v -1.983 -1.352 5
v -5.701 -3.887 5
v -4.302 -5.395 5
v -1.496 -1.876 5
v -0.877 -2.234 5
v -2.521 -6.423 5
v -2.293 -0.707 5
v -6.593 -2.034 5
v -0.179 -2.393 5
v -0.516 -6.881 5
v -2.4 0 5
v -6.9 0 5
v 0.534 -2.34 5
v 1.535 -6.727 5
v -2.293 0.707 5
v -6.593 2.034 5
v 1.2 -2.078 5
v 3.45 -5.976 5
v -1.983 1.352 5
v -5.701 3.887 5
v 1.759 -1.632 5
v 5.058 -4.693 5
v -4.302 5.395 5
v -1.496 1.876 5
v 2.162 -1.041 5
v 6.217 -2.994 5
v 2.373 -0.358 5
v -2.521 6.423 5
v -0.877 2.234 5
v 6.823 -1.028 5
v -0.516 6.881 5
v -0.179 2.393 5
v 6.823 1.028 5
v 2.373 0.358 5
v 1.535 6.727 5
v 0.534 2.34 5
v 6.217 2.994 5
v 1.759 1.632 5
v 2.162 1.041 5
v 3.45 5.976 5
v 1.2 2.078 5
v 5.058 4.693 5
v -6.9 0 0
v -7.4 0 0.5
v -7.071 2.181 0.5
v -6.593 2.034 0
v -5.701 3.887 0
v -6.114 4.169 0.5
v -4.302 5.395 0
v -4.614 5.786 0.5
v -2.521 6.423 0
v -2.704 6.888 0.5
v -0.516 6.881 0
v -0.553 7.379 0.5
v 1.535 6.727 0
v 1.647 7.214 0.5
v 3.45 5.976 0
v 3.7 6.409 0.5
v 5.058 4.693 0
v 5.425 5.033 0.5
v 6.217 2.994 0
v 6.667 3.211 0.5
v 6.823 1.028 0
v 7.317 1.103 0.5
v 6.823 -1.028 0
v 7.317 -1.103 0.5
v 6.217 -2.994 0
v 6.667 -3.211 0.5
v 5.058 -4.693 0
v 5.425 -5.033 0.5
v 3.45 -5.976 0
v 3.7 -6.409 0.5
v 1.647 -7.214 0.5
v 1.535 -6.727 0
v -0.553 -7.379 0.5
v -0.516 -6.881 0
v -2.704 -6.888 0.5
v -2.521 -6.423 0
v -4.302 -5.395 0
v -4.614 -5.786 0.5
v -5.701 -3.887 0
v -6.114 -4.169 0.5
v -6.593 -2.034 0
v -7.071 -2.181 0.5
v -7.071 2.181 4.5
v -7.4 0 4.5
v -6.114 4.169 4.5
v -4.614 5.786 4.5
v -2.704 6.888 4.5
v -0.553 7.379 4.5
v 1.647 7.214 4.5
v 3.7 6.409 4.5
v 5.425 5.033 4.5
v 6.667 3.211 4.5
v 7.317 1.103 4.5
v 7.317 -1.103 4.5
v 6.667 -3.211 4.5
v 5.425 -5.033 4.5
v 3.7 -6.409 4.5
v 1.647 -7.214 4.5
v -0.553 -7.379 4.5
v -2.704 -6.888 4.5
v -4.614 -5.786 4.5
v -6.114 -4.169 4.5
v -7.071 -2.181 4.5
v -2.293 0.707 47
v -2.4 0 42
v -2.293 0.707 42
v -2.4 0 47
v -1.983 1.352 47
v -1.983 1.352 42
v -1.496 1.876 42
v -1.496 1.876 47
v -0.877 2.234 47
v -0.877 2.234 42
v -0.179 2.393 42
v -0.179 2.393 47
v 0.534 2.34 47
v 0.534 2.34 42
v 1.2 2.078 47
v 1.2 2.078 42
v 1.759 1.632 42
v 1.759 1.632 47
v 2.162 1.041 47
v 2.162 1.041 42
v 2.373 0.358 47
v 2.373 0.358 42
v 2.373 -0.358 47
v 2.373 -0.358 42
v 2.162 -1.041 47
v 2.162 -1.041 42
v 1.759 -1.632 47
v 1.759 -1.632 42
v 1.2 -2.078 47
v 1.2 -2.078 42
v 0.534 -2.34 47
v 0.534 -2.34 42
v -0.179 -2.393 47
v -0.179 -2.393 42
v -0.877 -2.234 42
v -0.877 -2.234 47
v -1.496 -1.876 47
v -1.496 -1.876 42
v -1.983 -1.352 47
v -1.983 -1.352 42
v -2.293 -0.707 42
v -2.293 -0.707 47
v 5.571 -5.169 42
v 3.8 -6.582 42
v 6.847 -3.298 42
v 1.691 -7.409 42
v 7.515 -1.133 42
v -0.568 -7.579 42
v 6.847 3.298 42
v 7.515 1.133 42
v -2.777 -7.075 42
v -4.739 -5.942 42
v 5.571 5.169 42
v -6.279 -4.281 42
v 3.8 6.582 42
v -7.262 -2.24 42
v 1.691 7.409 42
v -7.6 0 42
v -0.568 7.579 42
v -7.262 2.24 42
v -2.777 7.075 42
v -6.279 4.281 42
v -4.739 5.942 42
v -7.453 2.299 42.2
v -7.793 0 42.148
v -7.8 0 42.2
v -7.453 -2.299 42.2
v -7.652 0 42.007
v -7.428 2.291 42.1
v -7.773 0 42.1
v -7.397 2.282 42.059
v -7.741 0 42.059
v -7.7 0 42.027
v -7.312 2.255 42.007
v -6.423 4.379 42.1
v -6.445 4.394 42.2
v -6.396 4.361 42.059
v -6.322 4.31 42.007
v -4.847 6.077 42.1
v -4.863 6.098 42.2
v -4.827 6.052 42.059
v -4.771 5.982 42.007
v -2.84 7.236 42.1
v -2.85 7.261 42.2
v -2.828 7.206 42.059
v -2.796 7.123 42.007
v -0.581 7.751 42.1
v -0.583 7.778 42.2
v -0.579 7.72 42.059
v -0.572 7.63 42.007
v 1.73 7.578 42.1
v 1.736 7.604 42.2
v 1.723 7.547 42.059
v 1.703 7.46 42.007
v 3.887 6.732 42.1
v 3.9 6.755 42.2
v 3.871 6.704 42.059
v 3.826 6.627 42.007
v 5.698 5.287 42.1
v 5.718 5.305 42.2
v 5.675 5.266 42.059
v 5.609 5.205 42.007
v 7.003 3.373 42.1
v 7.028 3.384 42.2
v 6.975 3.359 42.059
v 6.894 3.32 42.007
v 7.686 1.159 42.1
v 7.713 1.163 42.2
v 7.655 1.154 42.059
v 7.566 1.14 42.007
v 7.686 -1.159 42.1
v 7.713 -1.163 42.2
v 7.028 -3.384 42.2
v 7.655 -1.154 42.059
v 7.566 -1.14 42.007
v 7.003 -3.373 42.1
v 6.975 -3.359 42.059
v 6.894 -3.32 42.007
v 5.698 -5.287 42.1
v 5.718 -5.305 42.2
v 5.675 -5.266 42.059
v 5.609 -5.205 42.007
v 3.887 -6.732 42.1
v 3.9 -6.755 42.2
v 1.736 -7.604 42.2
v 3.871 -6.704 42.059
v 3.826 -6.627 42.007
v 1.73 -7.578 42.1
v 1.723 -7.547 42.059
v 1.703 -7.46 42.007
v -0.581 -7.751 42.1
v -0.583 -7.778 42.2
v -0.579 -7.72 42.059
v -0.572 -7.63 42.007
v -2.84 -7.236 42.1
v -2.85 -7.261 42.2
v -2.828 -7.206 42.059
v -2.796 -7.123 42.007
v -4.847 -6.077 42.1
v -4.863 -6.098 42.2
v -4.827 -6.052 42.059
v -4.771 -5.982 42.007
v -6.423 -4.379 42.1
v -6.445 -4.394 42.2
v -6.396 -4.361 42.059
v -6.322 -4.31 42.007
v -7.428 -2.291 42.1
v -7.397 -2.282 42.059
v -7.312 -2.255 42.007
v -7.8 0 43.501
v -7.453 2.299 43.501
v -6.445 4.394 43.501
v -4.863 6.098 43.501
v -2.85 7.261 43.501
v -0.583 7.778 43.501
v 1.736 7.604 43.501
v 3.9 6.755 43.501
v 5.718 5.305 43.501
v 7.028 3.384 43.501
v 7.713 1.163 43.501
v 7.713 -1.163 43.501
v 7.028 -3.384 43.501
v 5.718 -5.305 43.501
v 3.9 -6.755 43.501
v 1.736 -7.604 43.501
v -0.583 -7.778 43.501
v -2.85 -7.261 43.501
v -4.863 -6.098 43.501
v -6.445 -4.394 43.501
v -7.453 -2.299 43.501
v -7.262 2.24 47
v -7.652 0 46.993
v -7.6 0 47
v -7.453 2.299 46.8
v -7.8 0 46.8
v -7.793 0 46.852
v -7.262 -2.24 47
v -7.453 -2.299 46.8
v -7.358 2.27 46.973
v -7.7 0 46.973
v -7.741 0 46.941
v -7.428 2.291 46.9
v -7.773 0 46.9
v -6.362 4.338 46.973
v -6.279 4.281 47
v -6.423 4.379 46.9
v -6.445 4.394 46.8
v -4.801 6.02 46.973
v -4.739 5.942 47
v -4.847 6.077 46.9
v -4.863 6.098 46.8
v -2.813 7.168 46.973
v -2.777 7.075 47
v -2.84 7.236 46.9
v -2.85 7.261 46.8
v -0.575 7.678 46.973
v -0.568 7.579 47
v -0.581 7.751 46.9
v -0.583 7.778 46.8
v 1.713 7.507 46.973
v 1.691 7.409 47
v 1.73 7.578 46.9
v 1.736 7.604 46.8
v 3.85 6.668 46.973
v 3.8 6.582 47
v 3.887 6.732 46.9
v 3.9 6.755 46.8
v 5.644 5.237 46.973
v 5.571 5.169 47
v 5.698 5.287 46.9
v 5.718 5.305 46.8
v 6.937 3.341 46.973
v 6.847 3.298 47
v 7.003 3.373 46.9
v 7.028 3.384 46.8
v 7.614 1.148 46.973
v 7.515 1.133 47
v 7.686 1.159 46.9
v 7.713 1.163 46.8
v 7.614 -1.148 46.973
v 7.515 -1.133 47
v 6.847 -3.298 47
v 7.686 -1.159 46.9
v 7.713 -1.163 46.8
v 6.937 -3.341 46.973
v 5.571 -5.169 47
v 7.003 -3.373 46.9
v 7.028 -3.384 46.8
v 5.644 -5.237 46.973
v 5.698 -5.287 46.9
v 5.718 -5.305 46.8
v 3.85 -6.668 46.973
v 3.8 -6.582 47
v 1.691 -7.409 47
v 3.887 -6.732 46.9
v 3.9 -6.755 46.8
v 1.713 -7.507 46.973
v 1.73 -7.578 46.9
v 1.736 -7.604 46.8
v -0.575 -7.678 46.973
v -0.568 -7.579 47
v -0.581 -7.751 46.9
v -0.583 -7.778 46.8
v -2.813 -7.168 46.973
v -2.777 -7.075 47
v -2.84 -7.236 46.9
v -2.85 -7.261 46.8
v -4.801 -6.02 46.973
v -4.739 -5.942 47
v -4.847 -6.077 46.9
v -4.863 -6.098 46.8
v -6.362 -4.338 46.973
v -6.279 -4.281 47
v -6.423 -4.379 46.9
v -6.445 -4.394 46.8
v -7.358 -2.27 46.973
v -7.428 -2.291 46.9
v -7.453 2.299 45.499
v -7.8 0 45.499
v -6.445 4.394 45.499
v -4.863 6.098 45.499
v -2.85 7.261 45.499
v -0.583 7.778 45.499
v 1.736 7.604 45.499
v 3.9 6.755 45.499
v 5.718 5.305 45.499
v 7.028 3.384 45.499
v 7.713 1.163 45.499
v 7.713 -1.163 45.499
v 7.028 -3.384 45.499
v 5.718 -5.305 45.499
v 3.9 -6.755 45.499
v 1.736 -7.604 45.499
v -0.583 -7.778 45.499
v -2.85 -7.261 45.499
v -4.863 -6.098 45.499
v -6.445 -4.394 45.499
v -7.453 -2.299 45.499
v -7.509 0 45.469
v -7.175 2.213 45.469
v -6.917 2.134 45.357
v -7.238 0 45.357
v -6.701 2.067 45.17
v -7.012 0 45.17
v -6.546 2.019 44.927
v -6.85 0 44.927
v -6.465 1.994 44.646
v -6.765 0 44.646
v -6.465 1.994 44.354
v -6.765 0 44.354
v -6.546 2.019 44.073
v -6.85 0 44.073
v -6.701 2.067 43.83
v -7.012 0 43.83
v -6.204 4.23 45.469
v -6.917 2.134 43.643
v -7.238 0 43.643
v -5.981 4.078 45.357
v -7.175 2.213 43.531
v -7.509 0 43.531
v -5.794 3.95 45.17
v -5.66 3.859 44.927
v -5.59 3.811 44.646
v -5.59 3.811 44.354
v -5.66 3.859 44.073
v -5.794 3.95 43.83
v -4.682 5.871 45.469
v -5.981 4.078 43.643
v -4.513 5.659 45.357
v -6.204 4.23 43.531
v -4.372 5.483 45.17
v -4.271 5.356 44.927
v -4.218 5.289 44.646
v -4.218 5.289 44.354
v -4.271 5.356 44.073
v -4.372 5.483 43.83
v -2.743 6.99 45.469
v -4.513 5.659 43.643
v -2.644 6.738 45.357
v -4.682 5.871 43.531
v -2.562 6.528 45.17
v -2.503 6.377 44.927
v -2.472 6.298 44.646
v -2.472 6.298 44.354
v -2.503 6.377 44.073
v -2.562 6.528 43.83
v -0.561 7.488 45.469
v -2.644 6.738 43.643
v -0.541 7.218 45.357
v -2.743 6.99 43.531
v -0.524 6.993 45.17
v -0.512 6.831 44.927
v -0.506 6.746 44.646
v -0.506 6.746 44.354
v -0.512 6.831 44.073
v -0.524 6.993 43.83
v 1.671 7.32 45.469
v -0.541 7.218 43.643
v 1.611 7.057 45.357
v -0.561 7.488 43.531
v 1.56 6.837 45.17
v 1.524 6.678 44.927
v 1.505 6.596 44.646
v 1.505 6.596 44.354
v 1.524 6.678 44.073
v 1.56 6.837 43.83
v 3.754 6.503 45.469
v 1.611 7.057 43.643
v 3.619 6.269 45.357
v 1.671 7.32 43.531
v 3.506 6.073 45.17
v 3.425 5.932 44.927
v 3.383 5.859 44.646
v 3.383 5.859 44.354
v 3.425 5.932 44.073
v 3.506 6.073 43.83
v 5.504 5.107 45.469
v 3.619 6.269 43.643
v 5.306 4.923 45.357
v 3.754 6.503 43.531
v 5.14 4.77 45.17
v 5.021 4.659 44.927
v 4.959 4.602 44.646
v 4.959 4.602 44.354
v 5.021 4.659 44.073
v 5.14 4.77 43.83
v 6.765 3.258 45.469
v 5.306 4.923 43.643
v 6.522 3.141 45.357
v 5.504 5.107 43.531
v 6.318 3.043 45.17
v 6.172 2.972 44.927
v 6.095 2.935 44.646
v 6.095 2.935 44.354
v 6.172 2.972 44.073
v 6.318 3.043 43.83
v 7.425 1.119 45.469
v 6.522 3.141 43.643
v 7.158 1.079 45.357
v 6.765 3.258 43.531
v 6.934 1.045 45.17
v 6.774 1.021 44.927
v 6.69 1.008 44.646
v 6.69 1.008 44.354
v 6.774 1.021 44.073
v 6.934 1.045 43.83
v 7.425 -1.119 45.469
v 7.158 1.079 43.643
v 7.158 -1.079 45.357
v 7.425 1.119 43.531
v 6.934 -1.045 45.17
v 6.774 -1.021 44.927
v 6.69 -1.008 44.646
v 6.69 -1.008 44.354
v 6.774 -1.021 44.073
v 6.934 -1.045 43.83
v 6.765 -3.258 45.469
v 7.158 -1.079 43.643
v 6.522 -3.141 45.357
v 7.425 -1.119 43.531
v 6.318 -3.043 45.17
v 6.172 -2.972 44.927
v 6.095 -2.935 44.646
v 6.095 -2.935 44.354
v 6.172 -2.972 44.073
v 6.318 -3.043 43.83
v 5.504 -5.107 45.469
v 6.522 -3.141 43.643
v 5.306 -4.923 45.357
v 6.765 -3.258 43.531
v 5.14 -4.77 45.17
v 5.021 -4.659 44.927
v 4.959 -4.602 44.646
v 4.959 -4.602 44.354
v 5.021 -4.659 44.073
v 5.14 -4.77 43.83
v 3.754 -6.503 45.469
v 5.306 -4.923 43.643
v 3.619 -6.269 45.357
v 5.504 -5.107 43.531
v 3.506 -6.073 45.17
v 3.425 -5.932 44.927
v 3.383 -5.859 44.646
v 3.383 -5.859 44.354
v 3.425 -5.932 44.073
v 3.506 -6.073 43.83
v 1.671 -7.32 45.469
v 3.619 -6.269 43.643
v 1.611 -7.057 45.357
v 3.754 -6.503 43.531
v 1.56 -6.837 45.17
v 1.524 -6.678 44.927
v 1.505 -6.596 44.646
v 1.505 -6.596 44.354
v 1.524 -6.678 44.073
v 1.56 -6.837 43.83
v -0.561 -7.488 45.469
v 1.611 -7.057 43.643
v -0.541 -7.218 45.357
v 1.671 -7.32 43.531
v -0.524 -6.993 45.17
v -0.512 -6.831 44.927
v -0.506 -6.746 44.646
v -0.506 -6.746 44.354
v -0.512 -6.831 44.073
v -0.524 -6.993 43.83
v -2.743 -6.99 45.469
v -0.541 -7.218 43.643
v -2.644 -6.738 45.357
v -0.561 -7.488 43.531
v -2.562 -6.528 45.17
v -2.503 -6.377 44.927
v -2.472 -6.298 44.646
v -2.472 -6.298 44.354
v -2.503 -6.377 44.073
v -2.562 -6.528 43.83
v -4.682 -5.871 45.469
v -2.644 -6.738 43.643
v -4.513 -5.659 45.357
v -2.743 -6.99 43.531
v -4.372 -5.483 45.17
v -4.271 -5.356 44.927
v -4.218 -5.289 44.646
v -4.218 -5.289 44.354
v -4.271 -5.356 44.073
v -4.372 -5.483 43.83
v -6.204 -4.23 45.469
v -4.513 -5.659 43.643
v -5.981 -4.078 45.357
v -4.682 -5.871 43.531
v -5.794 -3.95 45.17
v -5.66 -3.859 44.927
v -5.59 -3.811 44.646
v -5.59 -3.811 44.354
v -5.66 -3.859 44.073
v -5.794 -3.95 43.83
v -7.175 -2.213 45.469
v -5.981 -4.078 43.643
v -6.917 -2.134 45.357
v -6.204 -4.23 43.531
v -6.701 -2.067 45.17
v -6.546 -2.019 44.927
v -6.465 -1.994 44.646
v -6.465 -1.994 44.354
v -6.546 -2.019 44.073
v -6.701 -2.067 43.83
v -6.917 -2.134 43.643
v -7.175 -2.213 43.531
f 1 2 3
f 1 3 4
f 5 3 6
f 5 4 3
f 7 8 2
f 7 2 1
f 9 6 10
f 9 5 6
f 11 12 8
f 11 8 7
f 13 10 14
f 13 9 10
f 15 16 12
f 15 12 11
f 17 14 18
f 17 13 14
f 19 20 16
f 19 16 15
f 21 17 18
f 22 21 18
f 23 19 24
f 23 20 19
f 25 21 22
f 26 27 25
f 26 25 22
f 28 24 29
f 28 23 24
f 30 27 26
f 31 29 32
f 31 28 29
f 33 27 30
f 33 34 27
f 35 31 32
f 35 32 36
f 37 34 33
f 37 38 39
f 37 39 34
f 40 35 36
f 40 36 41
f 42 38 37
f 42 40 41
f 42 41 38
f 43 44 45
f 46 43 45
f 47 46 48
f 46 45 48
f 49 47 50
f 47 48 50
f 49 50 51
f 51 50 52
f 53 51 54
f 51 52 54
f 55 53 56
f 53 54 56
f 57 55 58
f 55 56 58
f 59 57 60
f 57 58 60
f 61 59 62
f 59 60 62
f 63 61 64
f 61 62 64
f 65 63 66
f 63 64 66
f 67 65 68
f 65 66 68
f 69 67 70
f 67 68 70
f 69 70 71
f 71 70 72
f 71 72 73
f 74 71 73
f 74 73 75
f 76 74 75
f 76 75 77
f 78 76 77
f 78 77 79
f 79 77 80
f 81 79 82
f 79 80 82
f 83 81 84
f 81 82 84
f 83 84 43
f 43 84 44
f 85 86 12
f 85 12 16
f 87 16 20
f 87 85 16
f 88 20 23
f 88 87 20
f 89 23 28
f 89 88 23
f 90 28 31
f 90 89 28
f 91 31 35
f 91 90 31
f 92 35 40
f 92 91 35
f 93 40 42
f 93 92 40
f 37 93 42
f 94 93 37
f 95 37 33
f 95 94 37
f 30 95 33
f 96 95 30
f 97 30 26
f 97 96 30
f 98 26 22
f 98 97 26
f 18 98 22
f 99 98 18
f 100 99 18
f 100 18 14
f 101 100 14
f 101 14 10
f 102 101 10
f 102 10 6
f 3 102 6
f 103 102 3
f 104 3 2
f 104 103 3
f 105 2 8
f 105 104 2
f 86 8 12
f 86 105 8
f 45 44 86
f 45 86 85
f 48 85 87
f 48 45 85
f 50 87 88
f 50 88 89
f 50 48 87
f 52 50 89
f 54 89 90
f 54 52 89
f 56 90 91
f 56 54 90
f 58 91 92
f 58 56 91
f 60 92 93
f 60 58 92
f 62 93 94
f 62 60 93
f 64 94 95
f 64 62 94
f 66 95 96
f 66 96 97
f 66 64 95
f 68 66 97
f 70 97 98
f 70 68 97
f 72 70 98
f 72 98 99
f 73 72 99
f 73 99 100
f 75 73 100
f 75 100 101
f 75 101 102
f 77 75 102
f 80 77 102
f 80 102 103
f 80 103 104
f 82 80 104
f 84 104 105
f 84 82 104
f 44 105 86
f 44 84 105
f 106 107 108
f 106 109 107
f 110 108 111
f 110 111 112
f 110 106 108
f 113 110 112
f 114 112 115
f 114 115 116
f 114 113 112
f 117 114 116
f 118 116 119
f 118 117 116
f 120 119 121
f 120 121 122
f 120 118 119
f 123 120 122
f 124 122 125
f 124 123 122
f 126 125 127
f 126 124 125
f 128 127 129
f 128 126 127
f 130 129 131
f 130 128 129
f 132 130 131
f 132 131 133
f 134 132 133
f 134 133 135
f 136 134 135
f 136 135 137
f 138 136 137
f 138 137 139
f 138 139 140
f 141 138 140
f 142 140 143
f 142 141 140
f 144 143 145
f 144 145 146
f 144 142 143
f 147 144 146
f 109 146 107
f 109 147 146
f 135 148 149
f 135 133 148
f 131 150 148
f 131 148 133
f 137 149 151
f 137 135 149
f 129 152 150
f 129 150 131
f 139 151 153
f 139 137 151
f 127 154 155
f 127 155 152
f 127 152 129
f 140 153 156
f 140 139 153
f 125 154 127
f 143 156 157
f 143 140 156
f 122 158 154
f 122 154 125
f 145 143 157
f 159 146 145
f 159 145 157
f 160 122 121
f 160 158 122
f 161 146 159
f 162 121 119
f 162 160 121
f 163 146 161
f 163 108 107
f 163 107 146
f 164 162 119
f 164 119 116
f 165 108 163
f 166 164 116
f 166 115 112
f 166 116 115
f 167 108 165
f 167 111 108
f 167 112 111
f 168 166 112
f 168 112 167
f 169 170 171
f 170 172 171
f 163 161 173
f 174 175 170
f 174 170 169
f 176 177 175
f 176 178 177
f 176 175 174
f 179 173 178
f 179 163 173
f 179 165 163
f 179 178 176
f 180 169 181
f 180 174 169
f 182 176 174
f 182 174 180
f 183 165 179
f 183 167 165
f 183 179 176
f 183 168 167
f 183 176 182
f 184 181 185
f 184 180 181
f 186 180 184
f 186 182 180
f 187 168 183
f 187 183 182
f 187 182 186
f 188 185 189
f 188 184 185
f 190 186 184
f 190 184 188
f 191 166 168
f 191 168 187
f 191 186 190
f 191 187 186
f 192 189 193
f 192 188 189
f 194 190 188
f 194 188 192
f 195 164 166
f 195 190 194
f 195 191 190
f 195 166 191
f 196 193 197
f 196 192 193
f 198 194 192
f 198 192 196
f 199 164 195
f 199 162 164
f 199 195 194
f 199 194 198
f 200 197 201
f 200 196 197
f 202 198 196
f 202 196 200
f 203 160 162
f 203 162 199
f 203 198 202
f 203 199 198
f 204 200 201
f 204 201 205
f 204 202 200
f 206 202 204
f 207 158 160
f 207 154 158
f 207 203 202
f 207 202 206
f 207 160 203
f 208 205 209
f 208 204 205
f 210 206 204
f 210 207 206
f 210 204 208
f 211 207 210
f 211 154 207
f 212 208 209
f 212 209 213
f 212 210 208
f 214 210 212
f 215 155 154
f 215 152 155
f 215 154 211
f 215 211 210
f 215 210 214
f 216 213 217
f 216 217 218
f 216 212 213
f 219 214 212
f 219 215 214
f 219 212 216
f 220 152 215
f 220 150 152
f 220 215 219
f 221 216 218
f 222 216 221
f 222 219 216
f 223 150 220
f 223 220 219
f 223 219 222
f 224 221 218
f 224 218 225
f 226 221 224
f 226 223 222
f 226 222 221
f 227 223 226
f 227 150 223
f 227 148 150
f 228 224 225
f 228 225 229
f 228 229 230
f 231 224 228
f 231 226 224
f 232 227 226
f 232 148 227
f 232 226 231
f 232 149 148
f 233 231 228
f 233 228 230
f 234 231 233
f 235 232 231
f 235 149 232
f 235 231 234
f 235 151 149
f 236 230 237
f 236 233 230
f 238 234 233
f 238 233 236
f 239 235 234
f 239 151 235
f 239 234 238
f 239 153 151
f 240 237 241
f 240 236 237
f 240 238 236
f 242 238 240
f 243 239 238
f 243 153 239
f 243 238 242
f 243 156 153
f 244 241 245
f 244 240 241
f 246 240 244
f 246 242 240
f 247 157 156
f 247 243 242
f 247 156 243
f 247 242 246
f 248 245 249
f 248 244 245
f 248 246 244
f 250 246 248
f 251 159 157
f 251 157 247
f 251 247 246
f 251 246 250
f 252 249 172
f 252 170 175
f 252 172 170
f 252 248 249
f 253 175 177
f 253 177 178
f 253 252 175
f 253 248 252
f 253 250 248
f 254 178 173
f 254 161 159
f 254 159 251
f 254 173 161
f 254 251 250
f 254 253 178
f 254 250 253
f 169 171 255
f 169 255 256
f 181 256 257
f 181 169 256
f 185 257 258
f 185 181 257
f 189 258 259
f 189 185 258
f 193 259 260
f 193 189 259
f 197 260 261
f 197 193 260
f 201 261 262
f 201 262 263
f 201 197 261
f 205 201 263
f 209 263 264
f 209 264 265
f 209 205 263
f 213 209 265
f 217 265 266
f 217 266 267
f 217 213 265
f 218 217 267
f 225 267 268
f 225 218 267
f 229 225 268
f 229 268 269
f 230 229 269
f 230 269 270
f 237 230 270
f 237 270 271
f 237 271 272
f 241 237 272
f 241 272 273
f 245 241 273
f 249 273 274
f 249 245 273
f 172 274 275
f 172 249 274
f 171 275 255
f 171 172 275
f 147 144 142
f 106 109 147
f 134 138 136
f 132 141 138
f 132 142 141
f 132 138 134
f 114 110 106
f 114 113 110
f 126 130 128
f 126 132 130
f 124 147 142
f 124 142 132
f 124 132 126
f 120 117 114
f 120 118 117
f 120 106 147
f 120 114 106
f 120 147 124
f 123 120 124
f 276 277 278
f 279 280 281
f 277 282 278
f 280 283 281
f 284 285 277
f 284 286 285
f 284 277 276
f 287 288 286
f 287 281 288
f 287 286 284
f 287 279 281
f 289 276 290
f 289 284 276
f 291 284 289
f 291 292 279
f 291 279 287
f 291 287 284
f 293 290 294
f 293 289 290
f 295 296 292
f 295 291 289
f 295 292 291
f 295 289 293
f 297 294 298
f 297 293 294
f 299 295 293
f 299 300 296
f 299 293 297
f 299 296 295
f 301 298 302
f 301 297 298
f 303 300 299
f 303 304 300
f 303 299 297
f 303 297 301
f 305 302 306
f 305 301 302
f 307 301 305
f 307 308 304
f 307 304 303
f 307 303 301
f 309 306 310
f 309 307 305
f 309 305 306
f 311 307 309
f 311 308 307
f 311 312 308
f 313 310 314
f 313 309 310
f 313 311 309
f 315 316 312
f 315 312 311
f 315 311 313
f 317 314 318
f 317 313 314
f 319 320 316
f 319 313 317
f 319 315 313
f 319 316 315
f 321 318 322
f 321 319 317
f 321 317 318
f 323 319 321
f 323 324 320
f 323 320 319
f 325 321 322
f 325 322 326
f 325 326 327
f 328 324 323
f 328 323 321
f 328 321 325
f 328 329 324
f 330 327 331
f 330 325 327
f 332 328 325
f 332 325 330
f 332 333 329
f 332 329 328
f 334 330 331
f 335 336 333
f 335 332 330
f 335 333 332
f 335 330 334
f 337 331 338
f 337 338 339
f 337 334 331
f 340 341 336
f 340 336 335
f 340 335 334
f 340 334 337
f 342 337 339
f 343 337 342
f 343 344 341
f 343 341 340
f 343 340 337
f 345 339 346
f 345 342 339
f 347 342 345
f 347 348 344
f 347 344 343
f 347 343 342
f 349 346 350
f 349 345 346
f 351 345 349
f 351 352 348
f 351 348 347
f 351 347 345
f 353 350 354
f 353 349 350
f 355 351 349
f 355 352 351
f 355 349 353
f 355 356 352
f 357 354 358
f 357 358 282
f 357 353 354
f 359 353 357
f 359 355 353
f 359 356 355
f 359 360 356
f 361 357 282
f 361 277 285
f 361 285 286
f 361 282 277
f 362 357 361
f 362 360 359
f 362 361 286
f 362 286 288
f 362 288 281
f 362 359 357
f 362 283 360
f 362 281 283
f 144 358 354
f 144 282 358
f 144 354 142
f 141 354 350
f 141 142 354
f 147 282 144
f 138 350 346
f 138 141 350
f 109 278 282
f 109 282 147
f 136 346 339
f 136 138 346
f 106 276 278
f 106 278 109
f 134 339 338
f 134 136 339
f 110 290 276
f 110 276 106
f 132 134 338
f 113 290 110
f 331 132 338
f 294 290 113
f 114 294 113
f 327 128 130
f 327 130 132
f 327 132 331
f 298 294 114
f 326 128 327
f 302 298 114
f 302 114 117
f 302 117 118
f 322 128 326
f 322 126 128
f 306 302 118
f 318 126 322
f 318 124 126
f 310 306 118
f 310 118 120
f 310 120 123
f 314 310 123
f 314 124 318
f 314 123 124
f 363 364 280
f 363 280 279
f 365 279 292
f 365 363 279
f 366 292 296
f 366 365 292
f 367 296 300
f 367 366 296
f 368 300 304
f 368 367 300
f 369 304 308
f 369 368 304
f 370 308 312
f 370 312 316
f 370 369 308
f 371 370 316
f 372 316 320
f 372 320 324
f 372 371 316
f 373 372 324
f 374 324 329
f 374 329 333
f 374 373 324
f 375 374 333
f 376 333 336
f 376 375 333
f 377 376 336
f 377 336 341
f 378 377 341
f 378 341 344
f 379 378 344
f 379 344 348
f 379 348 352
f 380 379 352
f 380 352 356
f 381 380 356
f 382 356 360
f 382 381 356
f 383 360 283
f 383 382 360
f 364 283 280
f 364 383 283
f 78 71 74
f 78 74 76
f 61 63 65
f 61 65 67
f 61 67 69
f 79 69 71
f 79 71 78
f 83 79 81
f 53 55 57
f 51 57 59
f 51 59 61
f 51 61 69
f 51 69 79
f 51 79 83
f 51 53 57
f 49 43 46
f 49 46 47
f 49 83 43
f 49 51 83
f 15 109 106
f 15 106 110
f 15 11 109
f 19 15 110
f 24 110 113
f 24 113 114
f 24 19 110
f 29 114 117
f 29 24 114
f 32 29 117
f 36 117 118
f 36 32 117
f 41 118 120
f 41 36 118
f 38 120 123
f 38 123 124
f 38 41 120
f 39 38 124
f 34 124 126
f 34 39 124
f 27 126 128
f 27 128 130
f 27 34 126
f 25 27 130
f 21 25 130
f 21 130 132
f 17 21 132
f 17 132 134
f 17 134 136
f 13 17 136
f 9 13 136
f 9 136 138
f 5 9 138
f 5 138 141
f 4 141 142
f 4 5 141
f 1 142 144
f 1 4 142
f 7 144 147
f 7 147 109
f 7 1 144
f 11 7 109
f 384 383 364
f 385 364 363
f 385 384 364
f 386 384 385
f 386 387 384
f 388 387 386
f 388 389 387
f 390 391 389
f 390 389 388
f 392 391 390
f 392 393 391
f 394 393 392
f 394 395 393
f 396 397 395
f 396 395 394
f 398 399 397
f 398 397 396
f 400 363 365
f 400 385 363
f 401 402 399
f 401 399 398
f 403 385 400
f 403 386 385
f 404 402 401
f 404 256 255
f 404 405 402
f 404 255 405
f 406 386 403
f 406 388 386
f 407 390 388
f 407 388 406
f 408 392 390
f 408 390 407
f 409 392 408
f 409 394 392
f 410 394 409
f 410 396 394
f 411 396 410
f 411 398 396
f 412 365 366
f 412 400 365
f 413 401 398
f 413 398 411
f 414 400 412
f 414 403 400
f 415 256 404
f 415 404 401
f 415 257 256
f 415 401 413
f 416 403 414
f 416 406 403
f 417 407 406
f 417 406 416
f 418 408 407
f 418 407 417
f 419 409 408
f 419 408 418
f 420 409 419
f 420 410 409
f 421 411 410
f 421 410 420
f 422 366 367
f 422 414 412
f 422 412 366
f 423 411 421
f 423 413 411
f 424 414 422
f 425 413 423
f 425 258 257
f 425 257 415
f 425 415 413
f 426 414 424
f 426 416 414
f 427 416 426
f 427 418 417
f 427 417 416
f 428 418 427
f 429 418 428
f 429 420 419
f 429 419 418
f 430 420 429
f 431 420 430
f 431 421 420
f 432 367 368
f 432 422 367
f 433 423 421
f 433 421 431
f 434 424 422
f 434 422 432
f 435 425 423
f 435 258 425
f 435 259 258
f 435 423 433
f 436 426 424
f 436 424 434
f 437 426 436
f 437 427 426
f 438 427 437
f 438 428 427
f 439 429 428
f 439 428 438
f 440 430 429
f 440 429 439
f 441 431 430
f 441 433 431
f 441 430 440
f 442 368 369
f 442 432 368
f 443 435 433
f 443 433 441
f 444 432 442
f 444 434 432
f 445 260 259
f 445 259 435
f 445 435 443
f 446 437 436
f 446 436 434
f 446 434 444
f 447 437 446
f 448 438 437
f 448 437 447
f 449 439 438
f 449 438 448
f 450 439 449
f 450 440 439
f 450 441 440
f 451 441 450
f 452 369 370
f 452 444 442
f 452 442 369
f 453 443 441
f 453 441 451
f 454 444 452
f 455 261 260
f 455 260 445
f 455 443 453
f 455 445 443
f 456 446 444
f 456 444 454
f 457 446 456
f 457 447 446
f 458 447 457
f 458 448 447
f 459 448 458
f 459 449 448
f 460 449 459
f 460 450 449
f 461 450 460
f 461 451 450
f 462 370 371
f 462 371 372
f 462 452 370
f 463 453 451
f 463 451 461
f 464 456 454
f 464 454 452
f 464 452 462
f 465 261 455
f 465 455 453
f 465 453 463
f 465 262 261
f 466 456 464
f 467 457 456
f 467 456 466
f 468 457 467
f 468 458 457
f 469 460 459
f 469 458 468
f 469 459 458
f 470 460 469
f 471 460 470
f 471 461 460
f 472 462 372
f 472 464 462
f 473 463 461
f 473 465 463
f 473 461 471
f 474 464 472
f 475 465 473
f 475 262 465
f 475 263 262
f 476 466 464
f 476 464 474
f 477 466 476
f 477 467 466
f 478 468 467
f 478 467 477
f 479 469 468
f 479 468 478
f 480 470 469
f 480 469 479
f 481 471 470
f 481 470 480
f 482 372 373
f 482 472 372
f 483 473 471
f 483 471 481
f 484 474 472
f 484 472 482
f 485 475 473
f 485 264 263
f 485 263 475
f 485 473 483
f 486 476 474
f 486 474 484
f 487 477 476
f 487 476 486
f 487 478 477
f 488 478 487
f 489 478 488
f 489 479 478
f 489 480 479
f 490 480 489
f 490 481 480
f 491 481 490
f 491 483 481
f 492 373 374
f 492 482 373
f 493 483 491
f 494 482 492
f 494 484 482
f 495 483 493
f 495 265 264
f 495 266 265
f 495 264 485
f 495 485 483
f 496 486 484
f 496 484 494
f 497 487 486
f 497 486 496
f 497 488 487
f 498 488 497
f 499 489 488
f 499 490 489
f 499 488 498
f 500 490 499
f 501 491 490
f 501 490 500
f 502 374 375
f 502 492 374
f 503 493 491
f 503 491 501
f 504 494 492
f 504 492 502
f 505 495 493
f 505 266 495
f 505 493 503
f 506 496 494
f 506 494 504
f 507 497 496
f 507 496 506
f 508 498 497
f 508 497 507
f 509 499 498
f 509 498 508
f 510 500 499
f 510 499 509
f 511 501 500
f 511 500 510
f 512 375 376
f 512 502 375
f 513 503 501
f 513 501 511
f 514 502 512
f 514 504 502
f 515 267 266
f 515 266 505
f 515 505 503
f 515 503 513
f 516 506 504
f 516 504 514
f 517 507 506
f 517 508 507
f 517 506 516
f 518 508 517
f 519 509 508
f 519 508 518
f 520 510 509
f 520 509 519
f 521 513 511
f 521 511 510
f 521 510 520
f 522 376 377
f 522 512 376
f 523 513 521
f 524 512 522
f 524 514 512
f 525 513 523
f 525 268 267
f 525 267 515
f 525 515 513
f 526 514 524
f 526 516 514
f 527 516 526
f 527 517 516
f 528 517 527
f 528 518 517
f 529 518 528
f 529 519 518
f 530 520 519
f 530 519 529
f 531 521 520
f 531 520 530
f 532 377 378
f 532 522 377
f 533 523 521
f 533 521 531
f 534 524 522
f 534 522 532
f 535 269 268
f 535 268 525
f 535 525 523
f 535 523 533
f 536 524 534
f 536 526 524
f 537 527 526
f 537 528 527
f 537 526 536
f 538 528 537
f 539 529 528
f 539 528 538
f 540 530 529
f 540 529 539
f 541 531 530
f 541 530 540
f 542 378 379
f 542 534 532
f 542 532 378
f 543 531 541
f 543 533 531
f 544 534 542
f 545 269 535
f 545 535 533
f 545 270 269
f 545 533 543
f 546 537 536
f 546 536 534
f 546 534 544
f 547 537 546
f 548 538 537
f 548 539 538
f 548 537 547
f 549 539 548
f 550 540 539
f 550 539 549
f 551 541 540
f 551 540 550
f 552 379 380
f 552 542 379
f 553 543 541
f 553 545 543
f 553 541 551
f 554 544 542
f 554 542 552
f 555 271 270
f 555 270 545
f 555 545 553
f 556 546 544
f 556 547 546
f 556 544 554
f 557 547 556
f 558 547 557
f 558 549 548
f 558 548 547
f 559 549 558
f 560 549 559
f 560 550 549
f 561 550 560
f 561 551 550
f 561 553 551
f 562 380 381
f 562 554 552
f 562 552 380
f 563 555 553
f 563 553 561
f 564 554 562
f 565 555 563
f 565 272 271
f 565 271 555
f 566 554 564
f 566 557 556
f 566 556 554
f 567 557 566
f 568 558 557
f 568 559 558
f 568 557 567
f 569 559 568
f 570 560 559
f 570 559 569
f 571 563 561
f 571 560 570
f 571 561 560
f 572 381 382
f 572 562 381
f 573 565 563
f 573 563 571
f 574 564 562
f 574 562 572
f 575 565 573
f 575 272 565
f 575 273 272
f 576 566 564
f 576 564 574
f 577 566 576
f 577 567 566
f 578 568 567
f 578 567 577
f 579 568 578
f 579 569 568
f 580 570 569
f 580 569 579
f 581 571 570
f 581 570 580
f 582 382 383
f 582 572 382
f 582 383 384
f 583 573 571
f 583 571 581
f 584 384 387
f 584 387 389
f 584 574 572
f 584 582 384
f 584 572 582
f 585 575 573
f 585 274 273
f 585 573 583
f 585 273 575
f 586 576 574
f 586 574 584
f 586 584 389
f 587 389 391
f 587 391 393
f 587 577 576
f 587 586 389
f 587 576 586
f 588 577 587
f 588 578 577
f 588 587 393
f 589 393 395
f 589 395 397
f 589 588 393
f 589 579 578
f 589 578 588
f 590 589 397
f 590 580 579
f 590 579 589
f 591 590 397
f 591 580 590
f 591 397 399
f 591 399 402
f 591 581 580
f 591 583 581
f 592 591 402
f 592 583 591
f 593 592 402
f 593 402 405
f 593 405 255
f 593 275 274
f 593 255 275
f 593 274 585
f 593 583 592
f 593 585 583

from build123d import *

# Parameters (mm, degrees)
F2_SIZE = 0.5
F4_R    = 0.2


with BuildPart() as f1:
    # F0 (on Front) → F1 (revolve)
    with BuildSketch(Plane.XZ):
        Polygon((-7.4, 0), (0, 0), (0, 47), (-2.4, 47), (-2.4, 42), (-2.4, 5), (-7.4, 5), align=None)
    revolve(axis=Axis((0, 0, 23.5), (0, 0, -1)))

    # F2
    f2_edges = [f1.edges().sort_by_distance(p)[0] for p in [
        (7.4, 0, 5),
        (7.4, 0, 0),
    ]]
    chamfer(f2_edges, length=F2_SIZE)


with BuildPart() as f3:
    # F0 (on Front) → F3 (revolve)
    with BuildSketch(Plane.XZ):
        with BuildLine():
            Line((-2.4, 42), (-2.4, 47))
            Line((-2.4, 47), (-7.8, 47))
            Line((-7.8, 47), (-7.8, 45.498962))
            ThreePointArc((-7.8, 45.498962), (-6.754443, 44.5), (-7.8, 43.501038))
            Line((-7.8, 43.501038), (-7.8, 42))
            Line((-7.8, 42), (-2.4, 42))
        make_face()
    revolve(axis=Axis((0, 0, 23.5), (0, 0, -1)))

    # F4
    f4_edges = [f3.edges().sort_by_distance(p)[0] for p in [
        (7.8, 0, 47),
        (7.8, 0, 42),
    ]]
    fillet(f4_edges, radius=F4_R)


solid = Compound([f1.part, f3.part])
